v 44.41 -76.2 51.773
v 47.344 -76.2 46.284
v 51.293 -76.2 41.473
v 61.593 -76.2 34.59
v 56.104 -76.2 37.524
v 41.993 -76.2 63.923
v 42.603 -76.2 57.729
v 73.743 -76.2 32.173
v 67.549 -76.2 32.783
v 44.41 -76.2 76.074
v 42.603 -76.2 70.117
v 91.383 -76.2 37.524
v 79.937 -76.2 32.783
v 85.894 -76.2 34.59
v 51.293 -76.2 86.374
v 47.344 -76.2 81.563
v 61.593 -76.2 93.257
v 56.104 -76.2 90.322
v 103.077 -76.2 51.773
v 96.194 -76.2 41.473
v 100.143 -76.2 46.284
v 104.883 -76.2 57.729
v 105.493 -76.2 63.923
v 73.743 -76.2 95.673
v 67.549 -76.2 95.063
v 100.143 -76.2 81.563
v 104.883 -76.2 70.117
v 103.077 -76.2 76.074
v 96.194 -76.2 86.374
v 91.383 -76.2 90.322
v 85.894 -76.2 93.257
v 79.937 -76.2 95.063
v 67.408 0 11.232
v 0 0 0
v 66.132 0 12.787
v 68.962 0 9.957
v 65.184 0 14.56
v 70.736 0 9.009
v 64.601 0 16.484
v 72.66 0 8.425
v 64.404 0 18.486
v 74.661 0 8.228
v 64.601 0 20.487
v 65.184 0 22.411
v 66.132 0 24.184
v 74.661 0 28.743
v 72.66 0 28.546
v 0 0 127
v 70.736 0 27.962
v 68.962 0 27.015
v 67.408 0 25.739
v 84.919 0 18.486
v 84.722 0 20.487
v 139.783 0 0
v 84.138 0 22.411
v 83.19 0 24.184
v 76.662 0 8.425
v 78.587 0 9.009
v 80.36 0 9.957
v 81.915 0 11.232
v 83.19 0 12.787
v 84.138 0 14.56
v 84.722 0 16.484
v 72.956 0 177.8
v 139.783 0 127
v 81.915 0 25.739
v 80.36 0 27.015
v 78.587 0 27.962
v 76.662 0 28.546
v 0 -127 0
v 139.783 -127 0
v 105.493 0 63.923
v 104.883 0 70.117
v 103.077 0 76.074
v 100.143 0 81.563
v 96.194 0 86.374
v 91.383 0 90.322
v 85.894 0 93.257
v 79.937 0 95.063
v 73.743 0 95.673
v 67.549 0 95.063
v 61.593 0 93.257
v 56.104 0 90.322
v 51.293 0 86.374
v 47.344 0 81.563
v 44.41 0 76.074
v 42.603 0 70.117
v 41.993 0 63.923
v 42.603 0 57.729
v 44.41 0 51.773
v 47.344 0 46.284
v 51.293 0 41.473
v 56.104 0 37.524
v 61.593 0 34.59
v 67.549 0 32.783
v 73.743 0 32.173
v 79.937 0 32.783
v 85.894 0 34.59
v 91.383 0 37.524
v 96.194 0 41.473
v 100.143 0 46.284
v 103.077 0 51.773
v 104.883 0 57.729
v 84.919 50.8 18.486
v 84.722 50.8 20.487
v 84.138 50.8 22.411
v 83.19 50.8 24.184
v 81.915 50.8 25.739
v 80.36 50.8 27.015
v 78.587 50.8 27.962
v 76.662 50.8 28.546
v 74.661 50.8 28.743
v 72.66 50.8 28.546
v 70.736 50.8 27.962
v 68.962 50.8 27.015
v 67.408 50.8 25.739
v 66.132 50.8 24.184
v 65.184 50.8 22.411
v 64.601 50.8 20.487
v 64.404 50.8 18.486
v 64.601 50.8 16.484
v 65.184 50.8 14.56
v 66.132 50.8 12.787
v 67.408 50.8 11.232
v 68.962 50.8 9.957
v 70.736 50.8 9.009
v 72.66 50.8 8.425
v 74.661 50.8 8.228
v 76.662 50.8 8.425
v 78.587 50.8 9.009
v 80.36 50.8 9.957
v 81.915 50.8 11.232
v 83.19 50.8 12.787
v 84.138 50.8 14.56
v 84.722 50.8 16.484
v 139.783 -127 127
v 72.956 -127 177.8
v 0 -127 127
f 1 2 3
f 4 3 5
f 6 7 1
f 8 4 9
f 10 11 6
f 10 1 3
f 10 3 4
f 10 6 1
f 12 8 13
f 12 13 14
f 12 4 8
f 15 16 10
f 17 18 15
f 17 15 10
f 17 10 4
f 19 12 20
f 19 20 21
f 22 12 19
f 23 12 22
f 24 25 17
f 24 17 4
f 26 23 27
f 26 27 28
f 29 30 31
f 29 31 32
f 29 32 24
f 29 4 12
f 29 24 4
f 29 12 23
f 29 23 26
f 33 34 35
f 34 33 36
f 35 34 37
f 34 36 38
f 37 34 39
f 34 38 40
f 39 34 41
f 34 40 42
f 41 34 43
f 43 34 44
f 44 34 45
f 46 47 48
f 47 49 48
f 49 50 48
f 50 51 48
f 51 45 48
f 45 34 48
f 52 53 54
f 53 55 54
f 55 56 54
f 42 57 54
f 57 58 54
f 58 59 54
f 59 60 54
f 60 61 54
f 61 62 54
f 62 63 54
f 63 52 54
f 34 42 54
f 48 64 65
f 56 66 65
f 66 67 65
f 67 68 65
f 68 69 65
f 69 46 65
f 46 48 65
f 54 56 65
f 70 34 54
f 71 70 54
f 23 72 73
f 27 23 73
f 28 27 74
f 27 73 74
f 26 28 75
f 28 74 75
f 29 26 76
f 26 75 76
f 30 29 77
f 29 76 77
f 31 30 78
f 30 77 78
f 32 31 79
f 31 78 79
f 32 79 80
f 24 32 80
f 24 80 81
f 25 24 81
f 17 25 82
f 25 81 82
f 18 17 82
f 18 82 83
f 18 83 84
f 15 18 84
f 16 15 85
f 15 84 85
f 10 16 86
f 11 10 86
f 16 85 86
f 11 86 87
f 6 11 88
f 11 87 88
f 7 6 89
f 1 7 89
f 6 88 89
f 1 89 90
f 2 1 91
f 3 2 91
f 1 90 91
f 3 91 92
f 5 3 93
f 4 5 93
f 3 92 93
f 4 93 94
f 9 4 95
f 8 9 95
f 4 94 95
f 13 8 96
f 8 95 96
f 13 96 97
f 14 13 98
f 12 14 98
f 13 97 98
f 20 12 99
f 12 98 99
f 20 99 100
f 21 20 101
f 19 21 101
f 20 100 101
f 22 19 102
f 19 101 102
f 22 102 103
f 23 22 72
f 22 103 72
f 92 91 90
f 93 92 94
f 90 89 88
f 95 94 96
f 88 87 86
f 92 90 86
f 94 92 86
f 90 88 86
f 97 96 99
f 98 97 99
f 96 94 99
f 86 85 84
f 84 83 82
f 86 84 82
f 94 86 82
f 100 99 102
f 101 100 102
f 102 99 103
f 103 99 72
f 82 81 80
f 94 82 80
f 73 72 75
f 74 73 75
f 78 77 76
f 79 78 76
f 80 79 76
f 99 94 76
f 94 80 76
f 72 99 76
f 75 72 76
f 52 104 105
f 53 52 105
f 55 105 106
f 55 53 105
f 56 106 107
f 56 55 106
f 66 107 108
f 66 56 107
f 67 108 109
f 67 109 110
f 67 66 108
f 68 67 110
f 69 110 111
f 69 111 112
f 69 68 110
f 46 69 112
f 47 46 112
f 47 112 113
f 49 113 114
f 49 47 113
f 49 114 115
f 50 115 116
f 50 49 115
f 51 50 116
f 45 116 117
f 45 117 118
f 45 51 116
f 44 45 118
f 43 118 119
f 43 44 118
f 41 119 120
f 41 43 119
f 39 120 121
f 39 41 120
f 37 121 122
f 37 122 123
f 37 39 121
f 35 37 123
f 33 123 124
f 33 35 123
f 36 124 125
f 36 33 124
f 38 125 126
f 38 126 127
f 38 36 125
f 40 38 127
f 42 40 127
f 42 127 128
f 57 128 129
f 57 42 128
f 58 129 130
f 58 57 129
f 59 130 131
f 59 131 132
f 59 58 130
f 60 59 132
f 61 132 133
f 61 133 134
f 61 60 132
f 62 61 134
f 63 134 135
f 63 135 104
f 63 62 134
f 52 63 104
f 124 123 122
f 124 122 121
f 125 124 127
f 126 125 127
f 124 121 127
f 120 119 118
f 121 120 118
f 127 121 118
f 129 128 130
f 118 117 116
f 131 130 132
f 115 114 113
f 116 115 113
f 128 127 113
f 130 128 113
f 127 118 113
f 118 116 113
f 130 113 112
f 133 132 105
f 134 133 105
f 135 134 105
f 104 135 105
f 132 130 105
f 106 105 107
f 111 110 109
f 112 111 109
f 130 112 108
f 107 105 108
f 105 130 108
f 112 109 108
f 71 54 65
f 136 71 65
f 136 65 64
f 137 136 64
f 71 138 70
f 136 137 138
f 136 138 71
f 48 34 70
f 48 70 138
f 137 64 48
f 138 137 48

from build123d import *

# Parameters (mm, degrees)
F0_W     = 139.783366
F0_H     = 127
F1_DEPTH = 127
F2_R     = 31.75
F3_DEPTH = 76.2
F4_R     = 10.257682
F5_DEPTH = 50.8


with BuildPart() as f1:
    # F0 (on Front) → F1 (new body)
    with BuildSketch(Plane.XZ):
        with Locations((69.891683, 63.5)):
            Rectangle(F0_W, F0_H)
        Polygon((72.955946, 177.8), (0, 127), (139.783366, 127), align=None)
    extrude(amount=F1_DEPTH)

    # F4 (on Front) → F5 (join)
    with BuildSketch(Plane.XZ):
        with Locations((74.66124, 18.485555)):
            Circle(F4_R)
    extrude(amount=-F5_DEPTH)


with BuildPart() as f3:
    # F2 (on Front) → F3 (new body)
    with BuildSketch(Plane.XZ):
        with Locations((73.743366, 63.923329)):
            Circle(F2_R)
    extrude(amount=F3_DEPTH)


solid = Compound([f1.part, f3.part])
